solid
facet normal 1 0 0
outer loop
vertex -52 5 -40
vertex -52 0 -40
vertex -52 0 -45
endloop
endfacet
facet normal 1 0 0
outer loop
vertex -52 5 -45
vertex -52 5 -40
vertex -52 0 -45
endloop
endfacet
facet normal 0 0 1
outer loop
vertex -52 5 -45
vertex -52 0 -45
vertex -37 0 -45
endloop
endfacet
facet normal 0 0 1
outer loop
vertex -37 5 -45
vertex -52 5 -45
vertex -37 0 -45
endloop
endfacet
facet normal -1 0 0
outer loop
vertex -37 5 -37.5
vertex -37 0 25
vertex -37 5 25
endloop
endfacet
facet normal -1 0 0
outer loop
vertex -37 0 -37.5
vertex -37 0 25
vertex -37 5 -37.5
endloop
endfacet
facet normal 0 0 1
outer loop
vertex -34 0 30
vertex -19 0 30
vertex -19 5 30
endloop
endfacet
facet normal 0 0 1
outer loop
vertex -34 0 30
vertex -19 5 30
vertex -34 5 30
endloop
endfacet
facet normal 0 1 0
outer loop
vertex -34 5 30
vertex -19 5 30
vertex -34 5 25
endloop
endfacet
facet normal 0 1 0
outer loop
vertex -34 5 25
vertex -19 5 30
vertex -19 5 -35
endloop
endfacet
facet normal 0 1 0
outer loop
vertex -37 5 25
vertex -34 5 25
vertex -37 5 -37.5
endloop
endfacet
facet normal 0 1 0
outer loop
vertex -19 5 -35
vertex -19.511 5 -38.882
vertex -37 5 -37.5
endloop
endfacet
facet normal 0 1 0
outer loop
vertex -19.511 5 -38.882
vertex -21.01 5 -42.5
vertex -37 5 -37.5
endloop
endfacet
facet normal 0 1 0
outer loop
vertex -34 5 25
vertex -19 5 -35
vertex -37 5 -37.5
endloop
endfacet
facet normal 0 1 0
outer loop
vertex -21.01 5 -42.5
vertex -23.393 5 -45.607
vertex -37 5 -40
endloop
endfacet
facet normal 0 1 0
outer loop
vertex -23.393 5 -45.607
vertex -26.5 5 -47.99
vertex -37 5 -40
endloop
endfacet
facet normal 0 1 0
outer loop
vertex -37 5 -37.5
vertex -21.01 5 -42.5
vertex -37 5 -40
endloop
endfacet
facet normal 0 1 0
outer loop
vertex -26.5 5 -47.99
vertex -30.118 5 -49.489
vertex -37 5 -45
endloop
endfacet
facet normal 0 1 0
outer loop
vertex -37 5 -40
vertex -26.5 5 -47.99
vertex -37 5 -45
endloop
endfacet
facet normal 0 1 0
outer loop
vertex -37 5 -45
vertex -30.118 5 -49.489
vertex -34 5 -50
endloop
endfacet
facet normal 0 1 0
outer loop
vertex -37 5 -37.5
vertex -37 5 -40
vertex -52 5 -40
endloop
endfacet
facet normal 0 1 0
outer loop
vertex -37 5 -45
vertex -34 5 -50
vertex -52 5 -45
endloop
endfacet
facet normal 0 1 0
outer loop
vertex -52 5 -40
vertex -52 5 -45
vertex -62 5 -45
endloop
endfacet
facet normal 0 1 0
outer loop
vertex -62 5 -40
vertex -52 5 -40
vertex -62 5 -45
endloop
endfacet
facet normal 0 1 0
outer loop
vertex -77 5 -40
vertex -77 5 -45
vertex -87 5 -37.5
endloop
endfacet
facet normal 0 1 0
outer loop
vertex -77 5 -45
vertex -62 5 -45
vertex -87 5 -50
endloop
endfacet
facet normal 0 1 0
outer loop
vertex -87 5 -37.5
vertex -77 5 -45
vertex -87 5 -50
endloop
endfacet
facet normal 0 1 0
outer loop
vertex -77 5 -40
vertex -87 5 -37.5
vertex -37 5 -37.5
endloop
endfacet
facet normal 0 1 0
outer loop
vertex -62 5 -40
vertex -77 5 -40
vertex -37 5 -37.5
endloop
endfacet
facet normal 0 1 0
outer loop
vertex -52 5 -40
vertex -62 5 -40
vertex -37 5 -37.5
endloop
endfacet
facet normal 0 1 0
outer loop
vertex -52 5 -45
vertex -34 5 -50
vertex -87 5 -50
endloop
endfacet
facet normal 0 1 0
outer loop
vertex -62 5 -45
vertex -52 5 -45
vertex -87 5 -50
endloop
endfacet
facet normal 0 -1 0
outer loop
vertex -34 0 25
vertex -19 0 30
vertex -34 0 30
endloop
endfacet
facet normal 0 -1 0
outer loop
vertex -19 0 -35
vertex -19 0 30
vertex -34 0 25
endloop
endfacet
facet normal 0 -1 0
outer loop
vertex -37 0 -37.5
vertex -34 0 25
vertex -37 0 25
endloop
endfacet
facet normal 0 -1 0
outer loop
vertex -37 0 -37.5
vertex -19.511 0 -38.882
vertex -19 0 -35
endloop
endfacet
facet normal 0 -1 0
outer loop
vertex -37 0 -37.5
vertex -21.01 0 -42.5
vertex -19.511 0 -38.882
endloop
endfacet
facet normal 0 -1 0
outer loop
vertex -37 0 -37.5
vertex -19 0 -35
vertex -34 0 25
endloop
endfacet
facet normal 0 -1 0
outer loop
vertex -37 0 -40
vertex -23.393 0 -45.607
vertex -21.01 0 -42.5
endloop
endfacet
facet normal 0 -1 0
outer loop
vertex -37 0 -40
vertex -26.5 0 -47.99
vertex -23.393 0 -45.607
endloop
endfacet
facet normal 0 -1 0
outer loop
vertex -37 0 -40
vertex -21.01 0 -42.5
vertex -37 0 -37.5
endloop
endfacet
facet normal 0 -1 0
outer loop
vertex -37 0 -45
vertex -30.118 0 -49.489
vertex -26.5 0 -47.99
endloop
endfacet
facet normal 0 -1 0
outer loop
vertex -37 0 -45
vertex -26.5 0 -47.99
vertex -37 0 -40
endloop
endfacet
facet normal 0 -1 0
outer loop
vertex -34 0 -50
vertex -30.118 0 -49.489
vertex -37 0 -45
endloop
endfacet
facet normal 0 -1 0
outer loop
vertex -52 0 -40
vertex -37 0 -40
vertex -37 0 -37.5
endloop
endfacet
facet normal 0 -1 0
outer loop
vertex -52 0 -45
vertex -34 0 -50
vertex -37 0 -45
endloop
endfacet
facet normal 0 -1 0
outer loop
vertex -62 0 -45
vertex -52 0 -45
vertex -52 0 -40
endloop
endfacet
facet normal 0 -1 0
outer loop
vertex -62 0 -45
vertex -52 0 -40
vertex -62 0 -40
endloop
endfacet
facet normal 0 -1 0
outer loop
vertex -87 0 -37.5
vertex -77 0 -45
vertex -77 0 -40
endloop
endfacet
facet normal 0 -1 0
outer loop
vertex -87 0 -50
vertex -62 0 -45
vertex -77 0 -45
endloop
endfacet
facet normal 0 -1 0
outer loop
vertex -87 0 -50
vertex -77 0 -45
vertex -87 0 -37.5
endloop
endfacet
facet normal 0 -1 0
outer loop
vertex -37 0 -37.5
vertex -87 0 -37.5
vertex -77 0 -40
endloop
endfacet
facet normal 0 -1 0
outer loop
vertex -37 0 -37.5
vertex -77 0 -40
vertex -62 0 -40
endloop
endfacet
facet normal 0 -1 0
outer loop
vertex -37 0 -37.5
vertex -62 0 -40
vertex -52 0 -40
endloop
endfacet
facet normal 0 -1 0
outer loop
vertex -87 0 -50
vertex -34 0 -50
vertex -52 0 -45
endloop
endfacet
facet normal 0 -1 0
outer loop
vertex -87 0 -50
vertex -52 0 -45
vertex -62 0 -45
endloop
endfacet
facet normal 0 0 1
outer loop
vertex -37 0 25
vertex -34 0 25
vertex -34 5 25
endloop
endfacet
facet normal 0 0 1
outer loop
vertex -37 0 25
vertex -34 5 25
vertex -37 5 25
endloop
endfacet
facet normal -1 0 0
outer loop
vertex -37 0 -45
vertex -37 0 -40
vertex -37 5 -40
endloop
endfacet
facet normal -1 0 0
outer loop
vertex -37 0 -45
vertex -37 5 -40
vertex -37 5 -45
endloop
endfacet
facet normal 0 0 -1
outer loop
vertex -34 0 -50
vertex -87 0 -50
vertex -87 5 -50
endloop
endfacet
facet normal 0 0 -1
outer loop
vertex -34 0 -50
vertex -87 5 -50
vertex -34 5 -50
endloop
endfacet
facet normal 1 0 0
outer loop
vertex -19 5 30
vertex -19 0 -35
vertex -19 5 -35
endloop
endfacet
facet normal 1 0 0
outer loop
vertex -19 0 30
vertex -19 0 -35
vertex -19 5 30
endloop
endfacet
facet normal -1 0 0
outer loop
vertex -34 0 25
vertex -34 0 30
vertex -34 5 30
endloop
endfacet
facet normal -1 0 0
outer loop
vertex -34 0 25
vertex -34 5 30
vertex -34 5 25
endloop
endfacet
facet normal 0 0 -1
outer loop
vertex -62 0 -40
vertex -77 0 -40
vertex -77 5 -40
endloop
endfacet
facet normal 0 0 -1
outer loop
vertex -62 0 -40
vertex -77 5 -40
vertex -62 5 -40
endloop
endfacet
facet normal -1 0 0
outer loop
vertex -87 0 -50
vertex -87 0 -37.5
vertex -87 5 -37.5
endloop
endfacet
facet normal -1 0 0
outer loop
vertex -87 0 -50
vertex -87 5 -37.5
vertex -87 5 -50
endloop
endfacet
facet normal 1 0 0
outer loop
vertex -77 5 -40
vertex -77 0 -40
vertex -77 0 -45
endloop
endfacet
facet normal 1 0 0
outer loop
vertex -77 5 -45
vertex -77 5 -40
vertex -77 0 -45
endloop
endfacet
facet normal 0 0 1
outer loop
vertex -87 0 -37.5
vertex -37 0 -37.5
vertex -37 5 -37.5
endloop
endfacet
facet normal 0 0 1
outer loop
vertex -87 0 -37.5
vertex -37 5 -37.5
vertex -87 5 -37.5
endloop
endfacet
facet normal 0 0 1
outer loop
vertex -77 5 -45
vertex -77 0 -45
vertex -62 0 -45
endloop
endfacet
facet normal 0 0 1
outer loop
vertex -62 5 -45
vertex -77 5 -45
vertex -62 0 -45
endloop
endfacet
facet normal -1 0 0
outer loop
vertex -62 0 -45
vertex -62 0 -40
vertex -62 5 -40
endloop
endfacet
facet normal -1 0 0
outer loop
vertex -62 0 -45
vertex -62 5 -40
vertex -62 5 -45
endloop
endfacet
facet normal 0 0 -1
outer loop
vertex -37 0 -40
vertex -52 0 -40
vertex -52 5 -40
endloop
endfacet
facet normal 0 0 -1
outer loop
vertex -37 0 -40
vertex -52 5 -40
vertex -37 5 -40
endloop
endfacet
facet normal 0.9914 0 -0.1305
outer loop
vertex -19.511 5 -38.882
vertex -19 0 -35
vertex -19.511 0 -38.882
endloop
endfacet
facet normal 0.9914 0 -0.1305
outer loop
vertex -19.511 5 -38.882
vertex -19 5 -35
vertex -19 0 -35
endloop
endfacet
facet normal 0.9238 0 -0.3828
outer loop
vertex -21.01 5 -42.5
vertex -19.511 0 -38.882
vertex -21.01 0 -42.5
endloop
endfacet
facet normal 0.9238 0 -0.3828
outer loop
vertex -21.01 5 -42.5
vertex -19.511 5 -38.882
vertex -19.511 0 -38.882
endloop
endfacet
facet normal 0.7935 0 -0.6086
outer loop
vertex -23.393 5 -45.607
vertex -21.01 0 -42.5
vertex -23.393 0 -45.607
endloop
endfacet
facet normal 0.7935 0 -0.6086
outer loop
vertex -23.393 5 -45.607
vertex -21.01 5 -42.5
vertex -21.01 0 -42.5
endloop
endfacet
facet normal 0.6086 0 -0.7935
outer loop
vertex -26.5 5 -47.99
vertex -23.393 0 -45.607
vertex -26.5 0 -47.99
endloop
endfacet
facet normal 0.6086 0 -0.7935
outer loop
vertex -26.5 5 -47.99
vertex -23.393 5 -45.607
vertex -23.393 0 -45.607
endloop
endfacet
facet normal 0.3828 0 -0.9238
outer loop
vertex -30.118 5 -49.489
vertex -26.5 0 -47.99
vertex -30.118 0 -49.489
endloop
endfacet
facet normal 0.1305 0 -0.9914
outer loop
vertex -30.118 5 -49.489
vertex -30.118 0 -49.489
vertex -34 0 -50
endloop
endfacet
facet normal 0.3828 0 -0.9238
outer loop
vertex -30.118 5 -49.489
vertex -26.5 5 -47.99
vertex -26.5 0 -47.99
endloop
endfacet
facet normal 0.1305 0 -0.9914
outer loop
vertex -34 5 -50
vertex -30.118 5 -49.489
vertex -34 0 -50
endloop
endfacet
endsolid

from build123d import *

# Parameters (mm, degrees)
SKETCH1_W           = 15
SKETCH1_H           = 5
BOSS_EXTRUDE1_DEPTH = 5
FILLET3_R           = 15


with BuildPart() as part:
    # Sketch1 → Boss-Extrude1 (new body)
    with BuildSketch(Plane(origin=(0, 0, 0), x_dir=(1, 0, 0), z_dir=(0, 1, 0))):
        Polygon((-34, -25), (-37, -25), (-37, 37.5), (-87, 37.5), (-87, 50), (-19, 50), (-19, -30), (-34, -30), align=None)
        with Locations((-69.5, 42.5)):
            Rectangle(SKETCH1_W, SKETCH1_H, mode=Mode.SUBTRACT)
        with Locations((-44.5, 42.5)):
            Rectangle(SKETCH1_W, SKETCH1_H, mode=Mode.SUBTRACT)
    extrude(amount=BOSS_EXTRUDE1_DEPTH)

    # Fillet3
    fillet3_edges = [part.edges().sort_by_distance(p)[0] for p in [
        (-19, 2.5, -50),
    ]]
    fillet(fillet3_edges, radius=FILLET3_R)


solid = part.part
